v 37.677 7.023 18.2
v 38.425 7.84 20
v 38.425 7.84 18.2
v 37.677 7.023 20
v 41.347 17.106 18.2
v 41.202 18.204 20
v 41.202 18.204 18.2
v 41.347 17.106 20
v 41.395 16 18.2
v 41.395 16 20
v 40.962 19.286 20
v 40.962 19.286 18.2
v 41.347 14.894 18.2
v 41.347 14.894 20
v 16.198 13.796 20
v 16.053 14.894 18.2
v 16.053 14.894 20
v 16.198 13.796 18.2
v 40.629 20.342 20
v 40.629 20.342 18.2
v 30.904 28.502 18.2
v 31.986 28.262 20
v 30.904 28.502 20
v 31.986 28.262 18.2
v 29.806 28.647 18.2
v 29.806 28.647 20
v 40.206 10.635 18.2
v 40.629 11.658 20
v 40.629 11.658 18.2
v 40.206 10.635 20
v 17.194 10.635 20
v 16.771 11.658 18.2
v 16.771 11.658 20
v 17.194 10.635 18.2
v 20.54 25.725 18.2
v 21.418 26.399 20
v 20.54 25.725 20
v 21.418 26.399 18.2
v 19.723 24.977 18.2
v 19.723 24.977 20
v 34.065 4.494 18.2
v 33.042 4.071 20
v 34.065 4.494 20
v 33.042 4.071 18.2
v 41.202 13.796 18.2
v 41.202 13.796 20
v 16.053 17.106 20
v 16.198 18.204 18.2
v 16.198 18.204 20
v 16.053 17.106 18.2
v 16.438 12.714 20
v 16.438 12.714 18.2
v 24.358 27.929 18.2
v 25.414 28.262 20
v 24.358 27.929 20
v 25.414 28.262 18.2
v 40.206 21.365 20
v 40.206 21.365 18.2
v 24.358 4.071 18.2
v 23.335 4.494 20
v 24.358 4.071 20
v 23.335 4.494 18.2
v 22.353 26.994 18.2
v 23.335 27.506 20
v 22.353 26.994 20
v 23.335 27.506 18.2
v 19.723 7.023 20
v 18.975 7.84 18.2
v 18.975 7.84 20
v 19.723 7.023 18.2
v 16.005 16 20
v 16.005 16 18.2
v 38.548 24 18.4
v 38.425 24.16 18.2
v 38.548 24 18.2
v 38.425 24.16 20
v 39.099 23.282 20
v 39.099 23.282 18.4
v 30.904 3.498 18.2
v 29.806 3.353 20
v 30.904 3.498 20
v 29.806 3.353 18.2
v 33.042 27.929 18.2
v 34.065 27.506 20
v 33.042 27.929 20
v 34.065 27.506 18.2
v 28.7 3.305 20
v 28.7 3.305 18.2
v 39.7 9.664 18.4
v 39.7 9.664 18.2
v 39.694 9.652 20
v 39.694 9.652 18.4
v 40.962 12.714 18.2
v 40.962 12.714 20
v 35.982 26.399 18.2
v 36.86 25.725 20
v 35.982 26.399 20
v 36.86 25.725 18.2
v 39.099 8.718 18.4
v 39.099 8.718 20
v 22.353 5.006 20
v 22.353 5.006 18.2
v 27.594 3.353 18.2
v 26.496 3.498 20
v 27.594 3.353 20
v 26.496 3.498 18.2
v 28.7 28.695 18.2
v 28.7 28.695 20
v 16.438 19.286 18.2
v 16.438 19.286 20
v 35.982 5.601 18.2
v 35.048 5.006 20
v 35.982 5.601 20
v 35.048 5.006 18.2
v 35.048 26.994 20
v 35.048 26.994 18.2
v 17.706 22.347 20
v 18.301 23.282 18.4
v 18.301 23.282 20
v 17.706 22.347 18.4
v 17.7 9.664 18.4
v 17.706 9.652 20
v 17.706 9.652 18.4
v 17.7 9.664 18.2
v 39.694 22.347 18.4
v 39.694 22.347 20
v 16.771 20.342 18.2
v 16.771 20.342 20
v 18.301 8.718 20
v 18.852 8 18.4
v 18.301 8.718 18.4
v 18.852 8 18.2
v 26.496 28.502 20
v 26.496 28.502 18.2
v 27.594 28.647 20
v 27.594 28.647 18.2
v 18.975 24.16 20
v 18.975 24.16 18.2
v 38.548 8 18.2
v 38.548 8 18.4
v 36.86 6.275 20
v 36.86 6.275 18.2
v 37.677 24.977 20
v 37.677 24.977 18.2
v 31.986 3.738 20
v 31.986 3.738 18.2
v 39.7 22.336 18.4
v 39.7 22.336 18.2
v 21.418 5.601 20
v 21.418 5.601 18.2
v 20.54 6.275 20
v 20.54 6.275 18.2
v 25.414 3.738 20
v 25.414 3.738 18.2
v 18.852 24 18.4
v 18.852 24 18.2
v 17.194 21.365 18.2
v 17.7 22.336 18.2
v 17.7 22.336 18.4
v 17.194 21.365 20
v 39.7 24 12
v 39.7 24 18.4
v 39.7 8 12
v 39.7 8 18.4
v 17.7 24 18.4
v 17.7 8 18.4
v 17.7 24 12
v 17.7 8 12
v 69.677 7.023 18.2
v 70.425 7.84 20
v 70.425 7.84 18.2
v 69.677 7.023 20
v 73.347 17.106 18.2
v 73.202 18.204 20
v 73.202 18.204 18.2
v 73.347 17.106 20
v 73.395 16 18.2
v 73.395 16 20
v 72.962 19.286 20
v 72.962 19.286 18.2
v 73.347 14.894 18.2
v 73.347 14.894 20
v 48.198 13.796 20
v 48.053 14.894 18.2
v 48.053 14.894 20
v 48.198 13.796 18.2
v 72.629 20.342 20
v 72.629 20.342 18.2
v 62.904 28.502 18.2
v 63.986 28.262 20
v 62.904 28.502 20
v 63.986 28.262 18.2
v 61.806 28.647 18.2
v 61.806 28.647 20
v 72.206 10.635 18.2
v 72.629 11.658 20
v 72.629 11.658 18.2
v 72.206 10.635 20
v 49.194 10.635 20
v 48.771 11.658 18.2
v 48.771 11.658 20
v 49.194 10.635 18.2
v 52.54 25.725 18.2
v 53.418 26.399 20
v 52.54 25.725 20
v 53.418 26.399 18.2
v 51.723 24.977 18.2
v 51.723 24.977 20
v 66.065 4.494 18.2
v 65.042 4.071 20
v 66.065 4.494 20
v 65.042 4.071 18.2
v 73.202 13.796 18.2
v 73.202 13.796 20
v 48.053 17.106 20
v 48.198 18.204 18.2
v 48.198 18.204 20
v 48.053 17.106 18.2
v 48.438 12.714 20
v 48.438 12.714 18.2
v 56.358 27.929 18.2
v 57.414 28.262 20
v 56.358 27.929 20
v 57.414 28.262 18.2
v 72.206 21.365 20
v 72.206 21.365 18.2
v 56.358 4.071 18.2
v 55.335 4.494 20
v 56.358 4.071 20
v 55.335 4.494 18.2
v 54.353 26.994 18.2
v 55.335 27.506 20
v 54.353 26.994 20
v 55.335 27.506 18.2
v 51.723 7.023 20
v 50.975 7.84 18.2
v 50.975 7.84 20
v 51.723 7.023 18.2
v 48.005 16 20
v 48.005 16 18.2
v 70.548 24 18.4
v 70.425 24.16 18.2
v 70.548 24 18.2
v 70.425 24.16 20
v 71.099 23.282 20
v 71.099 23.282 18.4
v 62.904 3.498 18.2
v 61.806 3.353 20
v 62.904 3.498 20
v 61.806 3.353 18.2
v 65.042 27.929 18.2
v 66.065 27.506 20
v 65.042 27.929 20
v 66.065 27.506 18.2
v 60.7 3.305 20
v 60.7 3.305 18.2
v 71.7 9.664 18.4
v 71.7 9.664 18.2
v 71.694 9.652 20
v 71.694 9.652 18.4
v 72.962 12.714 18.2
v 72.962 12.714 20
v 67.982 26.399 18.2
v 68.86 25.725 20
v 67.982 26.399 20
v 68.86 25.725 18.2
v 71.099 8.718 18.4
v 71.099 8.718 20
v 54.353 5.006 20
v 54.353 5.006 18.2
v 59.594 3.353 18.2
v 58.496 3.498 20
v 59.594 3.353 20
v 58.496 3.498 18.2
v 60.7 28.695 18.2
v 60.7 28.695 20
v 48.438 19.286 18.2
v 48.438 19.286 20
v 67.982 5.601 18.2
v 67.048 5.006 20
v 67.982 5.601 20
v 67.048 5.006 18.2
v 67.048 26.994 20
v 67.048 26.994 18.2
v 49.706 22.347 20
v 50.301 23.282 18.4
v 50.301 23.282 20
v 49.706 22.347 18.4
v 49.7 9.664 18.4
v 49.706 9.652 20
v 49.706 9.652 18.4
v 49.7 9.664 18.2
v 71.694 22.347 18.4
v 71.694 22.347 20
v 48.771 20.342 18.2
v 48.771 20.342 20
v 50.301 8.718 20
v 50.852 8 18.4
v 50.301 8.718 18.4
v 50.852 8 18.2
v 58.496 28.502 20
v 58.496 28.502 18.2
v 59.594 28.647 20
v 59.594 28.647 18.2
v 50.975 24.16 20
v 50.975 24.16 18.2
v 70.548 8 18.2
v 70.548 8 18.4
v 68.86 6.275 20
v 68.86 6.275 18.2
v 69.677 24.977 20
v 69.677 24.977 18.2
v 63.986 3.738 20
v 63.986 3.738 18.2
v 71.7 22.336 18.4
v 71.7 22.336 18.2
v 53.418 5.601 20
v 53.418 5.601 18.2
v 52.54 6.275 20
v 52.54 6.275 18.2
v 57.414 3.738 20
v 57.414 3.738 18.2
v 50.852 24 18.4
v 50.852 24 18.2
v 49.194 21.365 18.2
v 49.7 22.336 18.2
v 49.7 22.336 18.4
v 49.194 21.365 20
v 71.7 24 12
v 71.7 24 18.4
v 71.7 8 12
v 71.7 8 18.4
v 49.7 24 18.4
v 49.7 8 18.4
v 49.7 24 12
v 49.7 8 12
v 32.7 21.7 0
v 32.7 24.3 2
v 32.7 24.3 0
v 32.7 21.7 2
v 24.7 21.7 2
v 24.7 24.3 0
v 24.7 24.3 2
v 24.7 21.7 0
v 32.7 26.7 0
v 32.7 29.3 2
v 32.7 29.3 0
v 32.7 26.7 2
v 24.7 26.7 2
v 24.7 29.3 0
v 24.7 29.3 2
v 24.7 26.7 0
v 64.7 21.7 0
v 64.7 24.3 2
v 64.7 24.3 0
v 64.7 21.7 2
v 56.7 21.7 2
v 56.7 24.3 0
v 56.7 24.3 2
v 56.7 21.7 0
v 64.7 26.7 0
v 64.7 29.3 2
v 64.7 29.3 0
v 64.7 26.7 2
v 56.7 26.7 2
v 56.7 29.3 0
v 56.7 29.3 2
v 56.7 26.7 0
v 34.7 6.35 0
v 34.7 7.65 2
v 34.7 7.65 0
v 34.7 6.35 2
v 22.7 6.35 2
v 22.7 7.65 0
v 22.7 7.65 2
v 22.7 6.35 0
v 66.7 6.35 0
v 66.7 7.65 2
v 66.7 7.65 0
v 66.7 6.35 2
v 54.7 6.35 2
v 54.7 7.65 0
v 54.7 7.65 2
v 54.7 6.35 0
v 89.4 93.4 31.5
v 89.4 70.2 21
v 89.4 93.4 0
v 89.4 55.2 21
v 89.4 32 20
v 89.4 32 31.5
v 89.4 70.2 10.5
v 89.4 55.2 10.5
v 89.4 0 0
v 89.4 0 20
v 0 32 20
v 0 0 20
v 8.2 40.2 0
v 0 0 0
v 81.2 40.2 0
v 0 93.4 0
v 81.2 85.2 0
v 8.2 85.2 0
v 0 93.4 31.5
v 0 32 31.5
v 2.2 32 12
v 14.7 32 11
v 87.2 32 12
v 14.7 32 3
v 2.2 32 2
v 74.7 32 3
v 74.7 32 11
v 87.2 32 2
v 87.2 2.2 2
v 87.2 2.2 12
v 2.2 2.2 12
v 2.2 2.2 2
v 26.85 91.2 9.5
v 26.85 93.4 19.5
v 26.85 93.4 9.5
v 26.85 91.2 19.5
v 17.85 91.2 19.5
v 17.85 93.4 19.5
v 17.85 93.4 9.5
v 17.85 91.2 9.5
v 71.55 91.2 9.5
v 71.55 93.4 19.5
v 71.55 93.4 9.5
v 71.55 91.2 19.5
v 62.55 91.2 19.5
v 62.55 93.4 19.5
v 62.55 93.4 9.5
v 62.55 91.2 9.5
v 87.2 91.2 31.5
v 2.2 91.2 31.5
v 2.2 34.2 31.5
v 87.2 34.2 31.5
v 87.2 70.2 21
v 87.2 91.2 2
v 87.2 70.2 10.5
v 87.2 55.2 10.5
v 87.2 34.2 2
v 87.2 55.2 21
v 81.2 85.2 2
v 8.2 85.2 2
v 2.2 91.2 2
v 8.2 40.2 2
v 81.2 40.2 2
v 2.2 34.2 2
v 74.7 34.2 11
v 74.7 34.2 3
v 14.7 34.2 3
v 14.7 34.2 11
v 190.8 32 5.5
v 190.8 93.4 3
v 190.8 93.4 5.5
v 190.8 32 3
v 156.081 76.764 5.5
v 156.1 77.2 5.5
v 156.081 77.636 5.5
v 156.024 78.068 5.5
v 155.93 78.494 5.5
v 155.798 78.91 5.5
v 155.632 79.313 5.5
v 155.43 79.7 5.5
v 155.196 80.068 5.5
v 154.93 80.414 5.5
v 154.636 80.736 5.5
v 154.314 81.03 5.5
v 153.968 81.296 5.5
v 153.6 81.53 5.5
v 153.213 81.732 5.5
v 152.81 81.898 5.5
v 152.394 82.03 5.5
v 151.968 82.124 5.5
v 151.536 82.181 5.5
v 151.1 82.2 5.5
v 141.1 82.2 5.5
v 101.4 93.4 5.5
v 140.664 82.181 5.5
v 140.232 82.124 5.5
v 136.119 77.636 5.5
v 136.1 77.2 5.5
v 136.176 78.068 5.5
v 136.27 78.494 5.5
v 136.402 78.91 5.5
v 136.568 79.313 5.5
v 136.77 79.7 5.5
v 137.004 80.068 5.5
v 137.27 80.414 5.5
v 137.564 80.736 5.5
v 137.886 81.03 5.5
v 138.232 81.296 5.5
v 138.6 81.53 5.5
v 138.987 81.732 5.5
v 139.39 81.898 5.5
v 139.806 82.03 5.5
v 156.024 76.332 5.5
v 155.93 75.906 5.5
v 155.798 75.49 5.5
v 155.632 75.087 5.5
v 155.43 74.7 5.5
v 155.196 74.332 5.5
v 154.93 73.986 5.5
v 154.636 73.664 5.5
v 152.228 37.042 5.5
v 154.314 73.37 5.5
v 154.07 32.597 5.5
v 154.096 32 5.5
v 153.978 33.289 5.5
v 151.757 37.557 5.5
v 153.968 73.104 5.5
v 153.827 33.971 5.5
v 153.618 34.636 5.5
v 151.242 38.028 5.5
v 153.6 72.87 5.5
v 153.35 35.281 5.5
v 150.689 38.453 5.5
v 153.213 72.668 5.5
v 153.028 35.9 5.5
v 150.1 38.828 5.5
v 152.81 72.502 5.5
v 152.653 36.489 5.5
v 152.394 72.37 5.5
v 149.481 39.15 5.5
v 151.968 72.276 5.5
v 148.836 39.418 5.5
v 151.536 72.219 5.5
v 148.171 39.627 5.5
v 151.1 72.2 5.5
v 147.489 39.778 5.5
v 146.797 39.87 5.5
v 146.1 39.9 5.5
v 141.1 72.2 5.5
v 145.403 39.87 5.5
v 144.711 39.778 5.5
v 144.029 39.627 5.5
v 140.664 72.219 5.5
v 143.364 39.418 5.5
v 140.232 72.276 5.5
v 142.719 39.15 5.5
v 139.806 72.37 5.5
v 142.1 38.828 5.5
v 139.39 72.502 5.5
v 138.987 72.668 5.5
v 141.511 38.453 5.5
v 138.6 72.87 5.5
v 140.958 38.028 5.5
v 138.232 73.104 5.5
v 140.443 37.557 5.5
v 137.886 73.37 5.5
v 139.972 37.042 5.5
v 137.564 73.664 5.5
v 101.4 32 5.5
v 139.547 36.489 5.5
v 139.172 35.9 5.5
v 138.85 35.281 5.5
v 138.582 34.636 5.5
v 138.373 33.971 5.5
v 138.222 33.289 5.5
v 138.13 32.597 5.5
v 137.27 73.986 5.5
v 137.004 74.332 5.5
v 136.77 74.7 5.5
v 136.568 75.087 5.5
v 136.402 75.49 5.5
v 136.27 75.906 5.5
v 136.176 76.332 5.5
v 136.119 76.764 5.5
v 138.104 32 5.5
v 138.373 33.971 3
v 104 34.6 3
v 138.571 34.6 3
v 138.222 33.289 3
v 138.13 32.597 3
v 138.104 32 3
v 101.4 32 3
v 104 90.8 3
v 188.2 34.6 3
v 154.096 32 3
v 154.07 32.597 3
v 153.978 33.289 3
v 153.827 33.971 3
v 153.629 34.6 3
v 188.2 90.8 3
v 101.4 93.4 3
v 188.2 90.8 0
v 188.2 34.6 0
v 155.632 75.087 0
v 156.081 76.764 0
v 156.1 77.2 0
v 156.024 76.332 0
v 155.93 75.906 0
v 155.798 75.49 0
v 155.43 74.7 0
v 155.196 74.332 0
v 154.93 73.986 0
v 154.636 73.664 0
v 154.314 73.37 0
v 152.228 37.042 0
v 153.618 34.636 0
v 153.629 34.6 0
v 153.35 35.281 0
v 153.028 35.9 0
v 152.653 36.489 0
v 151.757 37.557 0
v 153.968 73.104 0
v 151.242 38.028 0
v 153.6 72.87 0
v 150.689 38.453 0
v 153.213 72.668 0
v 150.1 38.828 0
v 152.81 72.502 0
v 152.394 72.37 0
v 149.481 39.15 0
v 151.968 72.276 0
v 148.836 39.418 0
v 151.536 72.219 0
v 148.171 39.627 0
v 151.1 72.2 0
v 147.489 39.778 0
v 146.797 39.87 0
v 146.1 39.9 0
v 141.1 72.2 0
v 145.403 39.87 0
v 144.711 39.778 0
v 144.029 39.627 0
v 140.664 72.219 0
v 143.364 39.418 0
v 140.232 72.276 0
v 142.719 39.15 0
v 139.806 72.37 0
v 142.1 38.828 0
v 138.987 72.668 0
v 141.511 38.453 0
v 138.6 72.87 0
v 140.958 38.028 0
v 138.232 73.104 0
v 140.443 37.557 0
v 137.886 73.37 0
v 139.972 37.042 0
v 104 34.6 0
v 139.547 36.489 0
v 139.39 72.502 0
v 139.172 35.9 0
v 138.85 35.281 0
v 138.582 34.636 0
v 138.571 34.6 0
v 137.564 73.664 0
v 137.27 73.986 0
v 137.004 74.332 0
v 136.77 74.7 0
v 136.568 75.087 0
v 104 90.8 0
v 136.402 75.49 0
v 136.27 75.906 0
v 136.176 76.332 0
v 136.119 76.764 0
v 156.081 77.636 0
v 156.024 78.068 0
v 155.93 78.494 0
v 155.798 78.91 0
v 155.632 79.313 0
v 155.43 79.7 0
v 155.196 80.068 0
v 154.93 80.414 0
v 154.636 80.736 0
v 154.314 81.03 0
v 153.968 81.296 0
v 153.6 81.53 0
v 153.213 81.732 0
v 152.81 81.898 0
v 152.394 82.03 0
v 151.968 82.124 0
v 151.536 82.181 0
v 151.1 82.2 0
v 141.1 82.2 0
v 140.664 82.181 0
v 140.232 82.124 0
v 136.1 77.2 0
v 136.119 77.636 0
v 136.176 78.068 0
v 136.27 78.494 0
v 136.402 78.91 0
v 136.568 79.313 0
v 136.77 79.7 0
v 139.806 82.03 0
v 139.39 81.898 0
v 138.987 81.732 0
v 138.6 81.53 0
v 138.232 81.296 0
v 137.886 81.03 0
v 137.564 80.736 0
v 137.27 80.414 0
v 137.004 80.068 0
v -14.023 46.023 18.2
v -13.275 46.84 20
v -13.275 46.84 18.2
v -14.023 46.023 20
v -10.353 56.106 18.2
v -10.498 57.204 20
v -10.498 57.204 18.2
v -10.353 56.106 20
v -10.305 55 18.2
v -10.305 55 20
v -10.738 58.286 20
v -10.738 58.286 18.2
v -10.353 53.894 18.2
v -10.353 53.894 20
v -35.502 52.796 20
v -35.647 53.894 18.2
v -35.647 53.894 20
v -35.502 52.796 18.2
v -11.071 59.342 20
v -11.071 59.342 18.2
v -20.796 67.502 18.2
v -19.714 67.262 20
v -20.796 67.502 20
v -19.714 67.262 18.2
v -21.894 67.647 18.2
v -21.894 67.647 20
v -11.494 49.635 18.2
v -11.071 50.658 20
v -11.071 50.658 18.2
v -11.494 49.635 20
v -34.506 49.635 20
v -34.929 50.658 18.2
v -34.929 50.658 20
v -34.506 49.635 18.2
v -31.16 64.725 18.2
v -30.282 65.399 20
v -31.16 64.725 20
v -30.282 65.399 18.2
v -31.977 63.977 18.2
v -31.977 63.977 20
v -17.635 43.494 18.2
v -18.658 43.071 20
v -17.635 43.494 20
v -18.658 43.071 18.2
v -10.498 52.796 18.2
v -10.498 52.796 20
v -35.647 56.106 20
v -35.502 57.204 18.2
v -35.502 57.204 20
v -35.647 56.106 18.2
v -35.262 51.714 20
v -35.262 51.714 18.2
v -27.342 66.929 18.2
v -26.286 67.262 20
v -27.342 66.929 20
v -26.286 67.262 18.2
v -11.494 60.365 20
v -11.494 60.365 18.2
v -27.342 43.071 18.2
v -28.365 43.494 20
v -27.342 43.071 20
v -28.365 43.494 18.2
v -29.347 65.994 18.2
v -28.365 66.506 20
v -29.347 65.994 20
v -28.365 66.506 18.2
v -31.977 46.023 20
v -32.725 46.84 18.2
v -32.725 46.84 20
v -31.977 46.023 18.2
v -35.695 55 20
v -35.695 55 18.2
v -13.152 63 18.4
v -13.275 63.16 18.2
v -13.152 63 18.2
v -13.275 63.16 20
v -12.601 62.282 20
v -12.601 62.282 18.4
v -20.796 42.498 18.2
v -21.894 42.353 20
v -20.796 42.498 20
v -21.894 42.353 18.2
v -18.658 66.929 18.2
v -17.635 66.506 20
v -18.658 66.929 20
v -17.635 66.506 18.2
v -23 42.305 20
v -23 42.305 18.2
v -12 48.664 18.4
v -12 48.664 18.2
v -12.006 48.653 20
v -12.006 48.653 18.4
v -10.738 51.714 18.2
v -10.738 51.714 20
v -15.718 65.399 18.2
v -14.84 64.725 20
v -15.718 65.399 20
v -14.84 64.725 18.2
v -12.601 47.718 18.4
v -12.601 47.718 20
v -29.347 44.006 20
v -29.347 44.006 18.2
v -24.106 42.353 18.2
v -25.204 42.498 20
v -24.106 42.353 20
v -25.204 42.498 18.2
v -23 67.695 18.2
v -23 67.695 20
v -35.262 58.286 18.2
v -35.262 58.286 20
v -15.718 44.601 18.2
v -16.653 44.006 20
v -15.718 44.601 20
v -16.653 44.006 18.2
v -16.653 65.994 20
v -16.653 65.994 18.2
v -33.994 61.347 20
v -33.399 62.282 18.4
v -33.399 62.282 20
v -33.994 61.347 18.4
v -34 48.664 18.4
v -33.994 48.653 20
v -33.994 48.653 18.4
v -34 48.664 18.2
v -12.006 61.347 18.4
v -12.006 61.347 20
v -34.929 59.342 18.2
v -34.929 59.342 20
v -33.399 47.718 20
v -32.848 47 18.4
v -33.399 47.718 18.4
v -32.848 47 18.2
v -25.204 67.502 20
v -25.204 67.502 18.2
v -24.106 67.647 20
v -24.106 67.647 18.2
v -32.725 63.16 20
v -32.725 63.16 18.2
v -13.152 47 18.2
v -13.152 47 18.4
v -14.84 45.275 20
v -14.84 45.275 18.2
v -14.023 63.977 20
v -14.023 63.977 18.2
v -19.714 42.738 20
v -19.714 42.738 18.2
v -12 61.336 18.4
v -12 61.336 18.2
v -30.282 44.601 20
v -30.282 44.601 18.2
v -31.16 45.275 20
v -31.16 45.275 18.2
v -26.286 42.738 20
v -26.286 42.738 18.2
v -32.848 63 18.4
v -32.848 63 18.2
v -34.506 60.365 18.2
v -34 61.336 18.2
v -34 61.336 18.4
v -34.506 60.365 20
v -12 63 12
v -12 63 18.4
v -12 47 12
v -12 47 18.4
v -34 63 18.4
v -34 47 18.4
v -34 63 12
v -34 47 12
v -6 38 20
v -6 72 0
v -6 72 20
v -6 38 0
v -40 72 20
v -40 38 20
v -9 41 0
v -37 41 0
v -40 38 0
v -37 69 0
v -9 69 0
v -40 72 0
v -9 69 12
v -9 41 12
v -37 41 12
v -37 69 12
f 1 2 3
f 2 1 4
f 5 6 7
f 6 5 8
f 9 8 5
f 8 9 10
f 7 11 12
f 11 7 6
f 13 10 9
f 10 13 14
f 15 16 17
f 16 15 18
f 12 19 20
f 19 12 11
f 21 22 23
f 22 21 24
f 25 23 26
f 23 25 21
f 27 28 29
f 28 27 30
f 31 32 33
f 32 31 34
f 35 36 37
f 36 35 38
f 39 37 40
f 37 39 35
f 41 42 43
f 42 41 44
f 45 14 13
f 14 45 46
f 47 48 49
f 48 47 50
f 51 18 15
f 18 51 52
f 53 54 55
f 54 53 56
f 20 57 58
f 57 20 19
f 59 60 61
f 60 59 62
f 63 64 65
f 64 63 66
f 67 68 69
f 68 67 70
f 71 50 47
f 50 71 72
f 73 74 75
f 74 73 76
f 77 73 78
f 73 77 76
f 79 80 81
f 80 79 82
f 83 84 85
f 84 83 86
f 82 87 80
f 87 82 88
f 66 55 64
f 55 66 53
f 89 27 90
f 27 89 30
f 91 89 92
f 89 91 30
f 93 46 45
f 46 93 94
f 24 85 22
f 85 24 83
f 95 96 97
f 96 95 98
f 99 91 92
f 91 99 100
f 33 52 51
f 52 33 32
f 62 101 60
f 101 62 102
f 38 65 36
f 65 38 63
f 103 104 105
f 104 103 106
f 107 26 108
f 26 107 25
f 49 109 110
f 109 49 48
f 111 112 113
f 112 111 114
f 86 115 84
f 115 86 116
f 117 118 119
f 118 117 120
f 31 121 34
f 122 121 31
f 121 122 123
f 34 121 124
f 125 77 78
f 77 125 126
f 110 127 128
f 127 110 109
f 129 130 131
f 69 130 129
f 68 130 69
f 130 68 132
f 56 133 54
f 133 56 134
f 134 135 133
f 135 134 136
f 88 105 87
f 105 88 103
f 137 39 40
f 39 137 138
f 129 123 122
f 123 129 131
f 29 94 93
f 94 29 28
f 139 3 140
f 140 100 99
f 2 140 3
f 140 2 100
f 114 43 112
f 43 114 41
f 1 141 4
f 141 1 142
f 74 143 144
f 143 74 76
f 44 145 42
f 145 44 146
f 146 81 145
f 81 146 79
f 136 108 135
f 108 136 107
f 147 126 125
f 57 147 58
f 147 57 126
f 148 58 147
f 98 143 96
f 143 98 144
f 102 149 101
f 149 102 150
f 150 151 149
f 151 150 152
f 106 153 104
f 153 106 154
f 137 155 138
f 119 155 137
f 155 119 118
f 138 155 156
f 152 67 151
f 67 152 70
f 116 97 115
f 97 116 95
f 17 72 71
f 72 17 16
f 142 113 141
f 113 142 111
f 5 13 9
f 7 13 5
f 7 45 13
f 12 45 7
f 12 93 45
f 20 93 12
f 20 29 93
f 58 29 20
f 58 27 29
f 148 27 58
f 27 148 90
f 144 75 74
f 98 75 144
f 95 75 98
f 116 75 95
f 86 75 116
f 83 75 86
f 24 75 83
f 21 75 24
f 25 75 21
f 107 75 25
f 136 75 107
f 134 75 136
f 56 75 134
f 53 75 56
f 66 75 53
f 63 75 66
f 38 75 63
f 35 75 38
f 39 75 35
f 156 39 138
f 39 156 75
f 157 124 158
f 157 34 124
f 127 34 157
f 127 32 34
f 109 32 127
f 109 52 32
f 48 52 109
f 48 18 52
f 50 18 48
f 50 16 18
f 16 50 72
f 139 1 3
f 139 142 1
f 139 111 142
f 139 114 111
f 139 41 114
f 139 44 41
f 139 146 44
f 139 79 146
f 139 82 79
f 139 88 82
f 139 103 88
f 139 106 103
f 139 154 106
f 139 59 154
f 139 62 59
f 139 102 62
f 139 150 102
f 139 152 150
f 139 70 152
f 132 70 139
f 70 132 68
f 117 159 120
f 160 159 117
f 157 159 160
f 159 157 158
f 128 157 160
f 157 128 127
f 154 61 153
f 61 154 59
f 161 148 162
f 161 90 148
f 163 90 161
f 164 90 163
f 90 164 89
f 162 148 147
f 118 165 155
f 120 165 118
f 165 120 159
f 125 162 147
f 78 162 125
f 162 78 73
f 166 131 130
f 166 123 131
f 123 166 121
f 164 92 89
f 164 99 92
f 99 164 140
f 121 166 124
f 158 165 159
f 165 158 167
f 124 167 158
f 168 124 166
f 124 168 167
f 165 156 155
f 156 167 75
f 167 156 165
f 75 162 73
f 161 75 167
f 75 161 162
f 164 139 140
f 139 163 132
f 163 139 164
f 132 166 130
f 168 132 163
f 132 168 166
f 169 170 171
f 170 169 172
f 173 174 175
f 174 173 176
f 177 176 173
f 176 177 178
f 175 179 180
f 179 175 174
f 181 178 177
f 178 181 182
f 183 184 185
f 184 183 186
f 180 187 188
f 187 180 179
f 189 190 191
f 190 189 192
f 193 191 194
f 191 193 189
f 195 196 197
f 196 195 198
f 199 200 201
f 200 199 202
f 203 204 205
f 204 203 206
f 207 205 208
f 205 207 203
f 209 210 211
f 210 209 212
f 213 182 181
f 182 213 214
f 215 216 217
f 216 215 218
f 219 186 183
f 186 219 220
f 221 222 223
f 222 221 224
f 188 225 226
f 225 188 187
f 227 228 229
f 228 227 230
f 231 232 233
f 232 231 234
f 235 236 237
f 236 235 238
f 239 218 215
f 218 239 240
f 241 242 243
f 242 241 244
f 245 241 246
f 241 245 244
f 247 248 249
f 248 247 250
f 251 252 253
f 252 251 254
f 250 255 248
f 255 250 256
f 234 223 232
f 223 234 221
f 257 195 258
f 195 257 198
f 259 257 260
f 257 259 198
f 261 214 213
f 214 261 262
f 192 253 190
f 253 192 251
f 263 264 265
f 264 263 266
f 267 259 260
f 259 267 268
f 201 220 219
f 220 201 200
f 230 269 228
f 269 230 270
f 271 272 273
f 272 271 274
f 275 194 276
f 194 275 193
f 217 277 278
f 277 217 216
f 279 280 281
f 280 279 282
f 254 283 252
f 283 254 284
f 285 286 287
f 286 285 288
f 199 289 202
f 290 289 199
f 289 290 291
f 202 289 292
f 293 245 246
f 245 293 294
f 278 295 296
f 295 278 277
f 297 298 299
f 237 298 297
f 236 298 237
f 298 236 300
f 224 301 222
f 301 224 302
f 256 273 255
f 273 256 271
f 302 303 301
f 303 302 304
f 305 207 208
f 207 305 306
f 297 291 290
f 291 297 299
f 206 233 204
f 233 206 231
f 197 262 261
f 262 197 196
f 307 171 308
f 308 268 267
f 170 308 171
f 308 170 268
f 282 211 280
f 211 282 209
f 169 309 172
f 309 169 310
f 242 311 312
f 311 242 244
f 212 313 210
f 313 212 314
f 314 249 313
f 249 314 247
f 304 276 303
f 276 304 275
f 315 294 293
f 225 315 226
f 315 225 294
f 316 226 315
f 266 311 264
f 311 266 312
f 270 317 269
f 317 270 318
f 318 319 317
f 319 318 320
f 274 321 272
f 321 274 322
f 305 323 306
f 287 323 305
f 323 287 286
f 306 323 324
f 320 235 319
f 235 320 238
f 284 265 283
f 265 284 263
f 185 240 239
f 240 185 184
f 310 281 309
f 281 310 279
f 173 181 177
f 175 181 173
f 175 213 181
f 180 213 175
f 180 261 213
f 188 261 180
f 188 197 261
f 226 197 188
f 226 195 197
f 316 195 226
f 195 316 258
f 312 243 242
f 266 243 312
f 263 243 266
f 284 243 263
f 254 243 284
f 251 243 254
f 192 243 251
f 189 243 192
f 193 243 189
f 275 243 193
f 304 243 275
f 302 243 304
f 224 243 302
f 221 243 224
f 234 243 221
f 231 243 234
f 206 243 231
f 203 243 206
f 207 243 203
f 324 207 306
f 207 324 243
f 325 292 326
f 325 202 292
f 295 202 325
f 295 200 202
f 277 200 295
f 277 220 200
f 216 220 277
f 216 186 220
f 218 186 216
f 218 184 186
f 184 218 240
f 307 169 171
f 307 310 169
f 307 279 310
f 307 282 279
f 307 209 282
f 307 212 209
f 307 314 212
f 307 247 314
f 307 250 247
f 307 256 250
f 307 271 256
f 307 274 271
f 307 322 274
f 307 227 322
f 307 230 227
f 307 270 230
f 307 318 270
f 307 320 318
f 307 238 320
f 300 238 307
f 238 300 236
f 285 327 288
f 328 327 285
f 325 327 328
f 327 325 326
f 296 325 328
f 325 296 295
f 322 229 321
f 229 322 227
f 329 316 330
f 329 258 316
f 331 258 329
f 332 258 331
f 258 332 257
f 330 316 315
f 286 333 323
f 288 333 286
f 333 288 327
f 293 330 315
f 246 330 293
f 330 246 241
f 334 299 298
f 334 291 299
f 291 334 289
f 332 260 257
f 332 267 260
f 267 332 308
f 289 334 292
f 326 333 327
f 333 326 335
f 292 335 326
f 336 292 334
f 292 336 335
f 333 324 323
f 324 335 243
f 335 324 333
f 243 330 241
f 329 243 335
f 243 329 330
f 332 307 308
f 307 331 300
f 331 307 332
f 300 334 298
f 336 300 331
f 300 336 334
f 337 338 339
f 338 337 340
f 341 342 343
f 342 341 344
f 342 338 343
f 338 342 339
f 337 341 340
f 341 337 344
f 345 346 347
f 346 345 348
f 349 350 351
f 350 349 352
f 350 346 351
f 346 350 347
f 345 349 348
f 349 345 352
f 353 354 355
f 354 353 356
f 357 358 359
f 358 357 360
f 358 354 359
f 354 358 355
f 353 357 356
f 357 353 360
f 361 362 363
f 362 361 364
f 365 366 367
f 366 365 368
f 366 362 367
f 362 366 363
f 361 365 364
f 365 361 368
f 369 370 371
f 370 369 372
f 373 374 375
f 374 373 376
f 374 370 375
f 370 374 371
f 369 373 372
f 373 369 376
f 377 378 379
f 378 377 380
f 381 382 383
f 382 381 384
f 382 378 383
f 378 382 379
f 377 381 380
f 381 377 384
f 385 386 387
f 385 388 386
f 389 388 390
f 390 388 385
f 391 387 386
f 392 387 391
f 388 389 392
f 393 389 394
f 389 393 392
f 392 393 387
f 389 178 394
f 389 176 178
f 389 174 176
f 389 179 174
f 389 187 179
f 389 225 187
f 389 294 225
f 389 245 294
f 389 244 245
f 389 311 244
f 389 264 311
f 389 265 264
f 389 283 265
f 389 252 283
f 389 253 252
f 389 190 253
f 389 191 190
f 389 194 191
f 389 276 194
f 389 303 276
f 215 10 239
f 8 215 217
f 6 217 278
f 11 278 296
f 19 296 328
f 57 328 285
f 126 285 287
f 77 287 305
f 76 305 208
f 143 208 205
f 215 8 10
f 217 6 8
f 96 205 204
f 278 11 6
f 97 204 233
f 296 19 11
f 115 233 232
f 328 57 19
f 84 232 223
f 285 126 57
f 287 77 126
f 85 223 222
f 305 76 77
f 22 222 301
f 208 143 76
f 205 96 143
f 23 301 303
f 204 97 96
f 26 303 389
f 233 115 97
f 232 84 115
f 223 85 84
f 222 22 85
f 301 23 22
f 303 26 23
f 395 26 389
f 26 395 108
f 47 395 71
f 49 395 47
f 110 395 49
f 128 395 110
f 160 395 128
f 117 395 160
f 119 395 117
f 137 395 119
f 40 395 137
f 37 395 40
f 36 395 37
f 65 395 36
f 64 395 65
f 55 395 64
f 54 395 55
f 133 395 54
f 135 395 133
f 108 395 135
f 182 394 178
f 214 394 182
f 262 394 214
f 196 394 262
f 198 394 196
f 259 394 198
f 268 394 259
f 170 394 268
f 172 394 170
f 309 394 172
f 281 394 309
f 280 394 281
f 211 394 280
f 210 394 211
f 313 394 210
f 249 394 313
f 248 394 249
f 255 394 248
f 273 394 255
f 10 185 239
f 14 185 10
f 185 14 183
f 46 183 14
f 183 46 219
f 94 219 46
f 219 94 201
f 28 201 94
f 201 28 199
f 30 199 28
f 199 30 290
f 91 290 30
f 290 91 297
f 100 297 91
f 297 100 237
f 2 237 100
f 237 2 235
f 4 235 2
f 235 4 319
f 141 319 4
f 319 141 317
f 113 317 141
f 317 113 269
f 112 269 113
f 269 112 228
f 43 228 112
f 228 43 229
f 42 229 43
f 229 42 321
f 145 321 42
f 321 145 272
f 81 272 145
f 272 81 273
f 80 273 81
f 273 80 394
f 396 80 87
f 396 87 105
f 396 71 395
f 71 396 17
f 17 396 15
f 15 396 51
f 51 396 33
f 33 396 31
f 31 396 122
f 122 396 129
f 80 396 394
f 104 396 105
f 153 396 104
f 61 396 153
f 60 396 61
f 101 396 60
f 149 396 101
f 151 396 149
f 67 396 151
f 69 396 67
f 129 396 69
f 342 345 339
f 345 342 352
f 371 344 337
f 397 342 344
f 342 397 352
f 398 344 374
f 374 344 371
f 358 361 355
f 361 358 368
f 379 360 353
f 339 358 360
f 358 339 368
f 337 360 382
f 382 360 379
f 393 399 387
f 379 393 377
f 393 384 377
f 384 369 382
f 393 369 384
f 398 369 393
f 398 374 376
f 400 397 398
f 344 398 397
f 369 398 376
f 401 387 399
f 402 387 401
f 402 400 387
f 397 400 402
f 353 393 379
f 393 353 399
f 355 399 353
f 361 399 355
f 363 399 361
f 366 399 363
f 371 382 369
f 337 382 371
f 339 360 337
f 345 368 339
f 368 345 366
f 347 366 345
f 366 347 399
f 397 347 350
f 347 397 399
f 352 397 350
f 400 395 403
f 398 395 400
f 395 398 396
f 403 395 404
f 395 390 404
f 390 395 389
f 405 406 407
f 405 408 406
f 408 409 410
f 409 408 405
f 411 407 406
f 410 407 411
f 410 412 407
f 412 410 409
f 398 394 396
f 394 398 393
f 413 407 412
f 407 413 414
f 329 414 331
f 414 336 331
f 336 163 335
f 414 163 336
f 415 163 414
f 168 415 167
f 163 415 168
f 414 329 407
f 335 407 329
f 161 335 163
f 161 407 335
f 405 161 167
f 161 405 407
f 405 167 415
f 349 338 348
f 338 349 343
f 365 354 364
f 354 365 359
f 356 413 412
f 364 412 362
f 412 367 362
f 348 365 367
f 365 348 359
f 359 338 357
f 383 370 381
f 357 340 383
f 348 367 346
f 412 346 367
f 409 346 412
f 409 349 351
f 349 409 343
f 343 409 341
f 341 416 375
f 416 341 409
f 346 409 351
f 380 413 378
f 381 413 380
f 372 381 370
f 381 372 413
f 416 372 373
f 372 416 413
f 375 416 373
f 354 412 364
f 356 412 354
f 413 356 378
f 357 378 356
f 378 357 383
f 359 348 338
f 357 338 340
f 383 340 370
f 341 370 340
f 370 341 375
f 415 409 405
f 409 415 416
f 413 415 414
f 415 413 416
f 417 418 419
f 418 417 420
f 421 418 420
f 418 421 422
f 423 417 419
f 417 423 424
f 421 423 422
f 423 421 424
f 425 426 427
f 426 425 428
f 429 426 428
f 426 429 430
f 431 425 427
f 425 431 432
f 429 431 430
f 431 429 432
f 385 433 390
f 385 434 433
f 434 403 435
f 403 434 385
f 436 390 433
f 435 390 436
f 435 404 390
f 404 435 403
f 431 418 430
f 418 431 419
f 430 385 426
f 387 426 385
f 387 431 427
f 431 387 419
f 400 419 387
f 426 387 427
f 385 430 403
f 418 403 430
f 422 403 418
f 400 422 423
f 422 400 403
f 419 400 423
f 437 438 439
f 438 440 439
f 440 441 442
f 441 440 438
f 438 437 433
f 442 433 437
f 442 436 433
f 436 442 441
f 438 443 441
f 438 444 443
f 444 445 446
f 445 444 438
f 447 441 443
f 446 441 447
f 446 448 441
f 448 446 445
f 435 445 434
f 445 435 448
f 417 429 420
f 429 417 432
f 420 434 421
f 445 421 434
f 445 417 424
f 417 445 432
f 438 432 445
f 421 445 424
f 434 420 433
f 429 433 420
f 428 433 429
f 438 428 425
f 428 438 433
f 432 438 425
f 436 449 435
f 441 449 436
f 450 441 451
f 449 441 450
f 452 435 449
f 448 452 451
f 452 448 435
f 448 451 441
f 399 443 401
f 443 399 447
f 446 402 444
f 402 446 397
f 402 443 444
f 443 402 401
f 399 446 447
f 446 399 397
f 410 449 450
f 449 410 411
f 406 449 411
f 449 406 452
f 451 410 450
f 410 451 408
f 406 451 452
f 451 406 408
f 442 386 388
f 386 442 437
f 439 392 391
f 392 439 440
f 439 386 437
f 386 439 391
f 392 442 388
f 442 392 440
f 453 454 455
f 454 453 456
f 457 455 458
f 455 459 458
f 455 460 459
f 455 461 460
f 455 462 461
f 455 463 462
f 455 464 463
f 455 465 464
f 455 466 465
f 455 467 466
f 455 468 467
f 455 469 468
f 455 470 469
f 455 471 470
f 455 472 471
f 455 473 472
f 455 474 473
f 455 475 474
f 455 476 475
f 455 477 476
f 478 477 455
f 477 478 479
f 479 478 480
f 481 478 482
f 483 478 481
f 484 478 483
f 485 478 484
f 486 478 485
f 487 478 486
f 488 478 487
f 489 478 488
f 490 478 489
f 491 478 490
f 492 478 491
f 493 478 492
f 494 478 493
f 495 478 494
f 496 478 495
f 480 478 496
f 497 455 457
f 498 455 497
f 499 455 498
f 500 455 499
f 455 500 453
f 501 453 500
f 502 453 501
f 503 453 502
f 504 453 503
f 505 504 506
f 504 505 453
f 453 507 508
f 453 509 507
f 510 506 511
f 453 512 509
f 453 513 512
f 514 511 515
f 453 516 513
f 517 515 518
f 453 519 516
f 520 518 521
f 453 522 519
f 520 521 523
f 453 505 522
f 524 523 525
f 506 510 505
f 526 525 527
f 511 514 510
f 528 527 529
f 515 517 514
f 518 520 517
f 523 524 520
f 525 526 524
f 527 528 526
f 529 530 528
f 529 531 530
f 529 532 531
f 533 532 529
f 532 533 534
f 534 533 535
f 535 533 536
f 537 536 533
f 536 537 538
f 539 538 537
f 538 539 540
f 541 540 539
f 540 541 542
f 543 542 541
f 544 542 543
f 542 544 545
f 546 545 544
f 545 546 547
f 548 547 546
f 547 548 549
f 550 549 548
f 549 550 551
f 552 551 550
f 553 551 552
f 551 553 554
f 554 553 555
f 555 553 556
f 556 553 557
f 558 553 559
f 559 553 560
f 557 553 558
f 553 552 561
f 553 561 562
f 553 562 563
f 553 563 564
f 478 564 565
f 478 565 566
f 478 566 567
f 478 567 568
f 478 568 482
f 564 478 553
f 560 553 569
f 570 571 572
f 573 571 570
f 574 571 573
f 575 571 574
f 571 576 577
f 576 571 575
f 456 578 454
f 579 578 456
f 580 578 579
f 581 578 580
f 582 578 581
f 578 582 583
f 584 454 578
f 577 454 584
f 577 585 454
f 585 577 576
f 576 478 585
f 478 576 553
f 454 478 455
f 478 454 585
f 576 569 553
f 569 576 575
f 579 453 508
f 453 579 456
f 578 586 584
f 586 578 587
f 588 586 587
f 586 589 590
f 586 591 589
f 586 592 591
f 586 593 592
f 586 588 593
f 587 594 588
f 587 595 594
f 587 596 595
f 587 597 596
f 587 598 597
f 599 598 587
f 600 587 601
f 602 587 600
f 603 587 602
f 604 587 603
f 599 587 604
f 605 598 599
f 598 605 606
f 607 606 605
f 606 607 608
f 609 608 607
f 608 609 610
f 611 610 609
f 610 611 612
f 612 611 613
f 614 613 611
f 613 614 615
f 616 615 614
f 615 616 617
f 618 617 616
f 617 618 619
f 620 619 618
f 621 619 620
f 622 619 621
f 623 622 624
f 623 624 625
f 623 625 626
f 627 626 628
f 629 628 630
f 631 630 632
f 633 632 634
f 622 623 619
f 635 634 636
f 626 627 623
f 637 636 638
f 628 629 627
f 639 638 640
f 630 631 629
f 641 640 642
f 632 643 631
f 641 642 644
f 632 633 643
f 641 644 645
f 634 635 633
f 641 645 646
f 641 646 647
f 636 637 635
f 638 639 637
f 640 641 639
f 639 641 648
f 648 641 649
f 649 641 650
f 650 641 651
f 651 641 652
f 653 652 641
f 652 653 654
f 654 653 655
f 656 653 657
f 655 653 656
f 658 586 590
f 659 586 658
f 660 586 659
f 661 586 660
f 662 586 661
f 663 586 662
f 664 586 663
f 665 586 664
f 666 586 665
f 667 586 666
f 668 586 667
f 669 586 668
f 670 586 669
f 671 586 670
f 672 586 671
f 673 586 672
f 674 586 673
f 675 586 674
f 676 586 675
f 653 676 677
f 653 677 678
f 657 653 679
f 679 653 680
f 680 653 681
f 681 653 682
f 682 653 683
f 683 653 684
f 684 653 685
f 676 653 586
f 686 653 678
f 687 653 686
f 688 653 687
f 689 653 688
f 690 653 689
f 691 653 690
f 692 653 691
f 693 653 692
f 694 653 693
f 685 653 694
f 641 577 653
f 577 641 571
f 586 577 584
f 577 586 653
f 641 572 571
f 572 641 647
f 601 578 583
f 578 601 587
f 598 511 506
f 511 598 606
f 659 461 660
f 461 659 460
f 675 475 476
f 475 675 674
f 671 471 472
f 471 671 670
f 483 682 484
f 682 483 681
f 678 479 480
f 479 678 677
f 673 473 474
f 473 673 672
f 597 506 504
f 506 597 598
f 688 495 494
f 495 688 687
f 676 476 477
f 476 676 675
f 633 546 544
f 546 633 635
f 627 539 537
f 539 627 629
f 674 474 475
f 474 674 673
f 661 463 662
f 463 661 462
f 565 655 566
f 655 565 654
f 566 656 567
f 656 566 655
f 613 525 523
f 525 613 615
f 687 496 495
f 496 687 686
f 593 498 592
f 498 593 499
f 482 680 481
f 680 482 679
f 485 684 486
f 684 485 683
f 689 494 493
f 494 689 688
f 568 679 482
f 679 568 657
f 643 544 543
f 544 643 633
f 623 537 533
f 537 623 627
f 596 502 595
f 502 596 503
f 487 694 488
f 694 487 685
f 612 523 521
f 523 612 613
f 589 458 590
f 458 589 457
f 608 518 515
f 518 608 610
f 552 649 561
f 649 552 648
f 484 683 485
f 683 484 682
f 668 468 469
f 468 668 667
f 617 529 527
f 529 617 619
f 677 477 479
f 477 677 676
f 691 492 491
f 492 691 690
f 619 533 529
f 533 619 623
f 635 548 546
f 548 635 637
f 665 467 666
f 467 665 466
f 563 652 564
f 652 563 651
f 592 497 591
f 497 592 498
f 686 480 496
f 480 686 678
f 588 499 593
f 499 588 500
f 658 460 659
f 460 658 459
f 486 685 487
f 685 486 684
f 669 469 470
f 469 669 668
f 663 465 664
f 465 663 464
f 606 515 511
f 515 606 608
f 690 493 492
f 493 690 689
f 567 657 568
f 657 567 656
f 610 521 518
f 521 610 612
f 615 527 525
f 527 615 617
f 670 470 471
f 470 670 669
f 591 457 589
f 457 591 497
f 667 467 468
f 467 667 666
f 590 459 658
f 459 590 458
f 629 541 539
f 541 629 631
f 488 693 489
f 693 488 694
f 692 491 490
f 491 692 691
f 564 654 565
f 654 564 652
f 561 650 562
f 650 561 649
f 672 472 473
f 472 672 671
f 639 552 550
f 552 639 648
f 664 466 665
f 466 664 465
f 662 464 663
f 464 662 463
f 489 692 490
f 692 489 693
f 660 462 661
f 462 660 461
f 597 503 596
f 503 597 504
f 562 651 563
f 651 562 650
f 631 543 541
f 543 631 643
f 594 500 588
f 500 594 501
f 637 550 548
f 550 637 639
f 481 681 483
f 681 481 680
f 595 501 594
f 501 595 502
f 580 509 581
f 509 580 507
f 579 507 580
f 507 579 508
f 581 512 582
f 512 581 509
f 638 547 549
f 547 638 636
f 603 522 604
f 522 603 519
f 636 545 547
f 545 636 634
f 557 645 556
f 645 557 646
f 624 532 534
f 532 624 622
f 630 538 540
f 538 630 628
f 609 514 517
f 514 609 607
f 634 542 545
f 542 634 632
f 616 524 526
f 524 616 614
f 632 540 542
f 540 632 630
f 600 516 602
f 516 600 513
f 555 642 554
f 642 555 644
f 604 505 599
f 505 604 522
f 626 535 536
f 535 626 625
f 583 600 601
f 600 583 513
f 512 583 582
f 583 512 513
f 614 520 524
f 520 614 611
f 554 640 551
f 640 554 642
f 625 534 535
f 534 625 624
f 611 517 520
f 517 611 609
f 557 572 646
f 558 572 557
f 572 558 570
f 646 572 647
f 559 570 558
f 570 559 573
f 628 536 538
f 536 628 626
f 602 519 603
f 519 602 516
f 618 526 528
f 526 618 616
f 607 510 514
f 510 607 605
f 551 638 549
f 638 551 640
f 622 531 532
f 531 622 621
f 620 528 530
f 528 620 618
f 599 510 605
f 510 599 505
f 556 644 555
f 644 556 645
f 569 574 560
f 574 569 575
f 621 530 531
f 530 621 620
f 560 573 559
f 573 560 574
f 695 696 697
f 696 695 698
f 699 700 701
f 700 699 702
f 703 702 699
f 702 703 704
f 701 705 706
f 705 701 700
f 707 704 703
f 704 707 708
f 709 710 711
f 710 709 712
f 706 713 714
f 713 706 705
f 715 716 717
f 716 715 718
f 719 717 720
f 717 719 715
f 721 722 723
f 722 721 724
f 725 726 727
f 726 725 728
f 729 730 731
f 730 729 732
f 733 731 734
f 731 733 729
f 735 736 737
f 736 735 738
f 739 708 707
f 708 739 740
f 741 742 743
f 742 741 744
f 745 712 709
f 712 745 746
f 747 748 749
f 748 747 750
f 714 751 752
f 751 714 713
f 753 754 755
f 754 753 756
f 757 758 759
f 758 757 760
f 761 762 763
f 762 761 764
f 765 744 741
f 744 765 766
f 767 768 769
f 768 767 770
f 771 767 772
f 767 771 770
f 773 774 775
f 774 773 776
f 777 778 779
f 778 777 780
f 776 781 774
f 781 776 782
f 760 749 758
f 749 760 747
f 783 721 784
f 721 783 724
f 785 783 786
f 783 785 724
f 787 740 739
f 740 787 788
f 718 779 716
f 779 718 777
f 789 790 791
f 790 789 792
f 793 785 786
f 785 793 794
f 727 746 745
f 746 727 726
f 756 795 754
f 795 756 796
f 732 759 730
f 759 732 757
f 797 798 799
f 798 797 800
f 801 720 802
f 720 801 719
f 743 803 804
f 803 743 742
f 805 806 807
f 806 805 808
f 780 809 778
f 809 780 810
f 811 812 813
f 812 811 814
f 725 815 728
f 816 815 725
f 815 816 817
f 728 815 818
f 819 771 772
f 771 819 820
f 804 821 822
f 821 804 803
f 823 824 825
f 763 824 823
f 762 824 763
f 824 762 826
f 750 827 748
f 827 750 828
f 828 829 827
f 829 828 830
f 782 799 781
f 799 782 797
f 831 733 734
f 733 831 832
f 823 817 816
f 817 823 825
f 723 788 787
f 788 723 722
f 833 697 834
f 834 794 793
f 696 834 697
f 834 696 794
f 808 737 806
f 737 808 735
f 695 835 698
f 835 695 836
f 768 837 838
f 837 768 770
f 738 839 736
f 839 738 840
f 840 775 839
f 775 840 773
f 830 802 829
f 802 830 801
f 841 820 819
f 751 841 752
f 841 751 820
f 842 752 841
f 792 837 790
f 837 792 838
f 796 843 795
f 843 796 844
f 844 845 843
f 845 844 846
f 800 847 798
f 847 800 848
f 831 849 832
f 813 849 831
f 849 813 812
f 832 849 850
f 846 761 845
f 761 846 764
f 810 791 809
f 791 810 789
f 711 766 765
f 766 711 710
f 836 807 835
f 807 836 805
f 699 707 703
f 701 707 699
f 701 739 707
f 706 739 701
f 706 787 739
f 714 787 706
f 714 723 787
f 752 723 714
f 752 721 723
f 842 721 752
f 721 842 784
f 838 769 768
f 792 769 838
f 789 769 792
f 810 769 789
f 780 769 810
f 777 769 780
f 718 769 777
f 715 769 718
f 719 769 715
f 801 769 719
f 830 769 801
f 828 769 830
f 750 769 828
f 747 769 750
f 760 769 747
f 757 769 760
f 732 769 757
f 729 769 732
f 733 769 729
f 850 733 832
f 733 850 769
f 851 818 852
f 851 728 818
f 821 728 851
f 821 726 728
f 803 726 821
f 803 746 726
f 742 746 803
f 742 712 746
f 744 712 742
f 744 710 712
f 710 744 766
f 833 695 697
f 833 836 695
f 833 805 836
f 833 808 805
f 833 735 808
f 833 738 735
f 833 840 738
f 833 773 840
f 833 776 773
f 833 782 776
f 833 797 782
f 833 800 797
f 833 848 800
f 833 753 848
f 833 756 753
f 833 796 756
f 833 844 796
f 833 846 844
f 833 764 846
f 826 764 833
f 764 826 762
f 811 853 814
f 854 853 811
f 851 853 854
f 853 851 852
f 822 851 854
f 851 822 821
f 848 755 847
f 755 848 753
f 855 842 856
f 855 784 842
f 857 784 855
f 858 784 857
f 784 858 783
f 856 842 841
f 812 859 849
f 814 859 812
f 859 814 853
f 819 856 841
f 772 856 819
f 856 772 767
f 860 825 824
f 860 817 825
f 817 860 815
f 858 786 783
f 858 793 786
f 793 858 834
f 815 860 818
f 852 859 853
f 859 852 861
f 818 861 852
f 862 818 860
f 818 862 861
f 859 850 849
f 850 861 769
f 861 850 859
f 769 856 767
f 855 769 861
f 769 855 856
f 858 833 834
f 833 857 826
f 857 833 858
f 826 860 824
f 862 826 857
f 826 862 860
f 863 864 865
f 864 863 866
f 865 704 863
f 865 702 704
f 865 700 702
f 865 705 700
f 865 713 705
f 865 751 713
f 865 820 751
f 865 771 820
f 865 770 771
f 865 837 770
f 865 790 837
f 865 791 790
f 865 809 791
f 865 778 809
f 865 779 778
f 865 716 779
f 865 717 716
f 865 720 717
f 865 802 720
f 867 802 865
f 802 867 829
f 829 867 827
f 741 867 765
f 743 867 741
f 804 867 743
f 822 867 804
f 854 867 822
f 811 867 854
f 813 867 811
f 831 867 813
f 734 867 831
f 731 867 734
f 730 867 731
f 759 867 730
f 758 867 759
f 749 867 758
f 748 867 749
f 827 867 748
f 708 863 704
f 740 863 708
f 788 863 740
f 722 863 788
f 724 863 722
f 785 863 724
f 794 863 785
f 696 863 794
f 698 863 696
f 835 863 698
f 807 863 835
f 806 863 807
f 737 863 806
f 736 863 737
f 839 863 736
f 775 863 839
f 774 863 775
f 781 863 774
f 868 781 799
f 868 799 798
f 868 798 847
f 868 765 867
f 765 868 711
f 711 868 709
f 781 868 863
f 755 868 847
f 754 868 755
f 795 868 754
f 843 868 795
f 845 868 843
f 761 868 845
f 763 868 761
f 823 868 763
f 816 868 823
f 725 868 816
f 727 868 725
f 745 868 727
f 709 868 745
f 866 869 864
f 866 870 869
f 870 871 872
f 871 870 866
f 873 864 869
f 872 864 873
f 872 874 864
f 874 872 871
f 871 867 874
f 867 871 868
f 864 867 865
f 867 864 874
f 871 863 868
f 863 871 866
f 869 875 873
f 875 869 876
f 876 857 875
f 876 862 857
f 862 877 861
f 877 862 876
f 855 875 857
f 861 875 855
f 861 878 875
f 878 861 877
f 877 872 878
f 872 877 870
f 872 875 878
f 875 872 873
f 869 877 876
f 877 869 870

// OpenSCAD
/* =====================================================================
   DESK HELPER — v6
   Closed box + lid. Screen mounts on top, separately.
   ---------------------------------------------------------------------
   WHAT CHANGED FROM v5
     - screen holder removed entirely; you build that on top of the lid
     - box walls raised so the lid clears the Pico and the jumper wires
     - removable lid with a locating lip
     - cable pass-through in the lid for the screen wires
     - USB cutout added — needed now that the walls are taller than
       the Pico's socket

   STILL BUILT AROUND YOUR STLs
     Button: cap / stem / guide / mount. The 24.89 mm mount disc drops
     into a counterbore in the front shelf and finishes flush. Cap ends
     up 9.4 mm above the shelf.

   HOLDING THE WIRES ON, WITHOUT SOLDER OR HOT GLUE
     Under each button the shelf floor has three slots. The single
     narrow one is a friction clamp: push the jumper wire into it and
     it grips by itself. The pair behind take a zip tie if you have
     one. Either way the wire is anchored ~10 mm downstream of the
     connector, so tugging the cable never levers the connector off
     the switch leg. That is what actually keeps it attached.

     Do NOT superglue near the switch. It wicks along stranded wire
     and into seams, and the stem has to slide freely just above.

   >>> CHECK usb_side BEFORE PRINTING <<<
   Look down at the tray with the buttons nearest you. If the Pico's
   USB socket points right, leave usb_side = 1. If left, set it to -1.
   ===================================================================== */

part = "all";     // "coupon" | "lid" | "tray" | "spacer" | "all"

/* ---------- FROM YOUR BUTTON STLs — already measured ---------------- */
mount_d    = 24.89;  // diameter of the mount disc
mount_t    = 1.80;   // thickness of the disc
mount_boss = [22.0, 16.0]; // slot below the disc. Yours arrive with
                           //   the tactile switch already fitted, and the
                           //   Dupont connectors on the legs splay out
                           //   wider than the switch body itself. This
                           //   cavity is fully hidden under the shelf, so
                           //   it costs nothing to leave it generous.

/* ---------- BREADBOARD ---------------------------------------------- */
bb_len     = 83.0;
bb_wid     = 55.0;
bb_h       = 9.5;    // INCLUDING adhesive backing

/* ---------- HEIGHT --------------------------------------------------- */
headroom   = 20.0;   // clear space above the breadboard surface.
                     //   A male Dupont housing stands ~11 mm proud and
                     //   the wire bends over above that. Lower this to
                     //   16 for a squatter box if your wiring is flat.

/* ---------- USB ------------------------------------------------------ */
usb_side   = 1;      // 1 = right wall, -1 = left wall
usb_w      = 15.0;   // opening width
usb_z0     = 10.5;   // bottom of the opening, above the floor
usb_z1     = 21.0;   // top. The socket itself only reaches ~17.4,
                     //   but a micro-USB plug's moulding is taller than
                     //   the socket, so the opening has to clear that
                     //   rather than just the connector.

/* ---------- LID ------------------------------------------------------ */
lid_t      = 2.5;
lid_lip    = 3.0;    // depth of the locating lip
lid_clr    = 0.4;    // clearance so it lifts off easily
cable_w    = 20.0;   // pass-through for the screen wires
cable_d    = 10.0;
cable_back = 14.0;   // its centre, measured in from the back wall

/* ---------- SPACER COLLAR -------------------------------------------- */
spacer_h   = 15.0;   // how much height it adds. 10-20 all work.
ledge_t    = 2.0;    // ledge the lid's lip lands on
sp_lipw    = 2.0;    // wall of the locating lip underneath

/* ---------- BUZZER --------------------------------------------------- */
buz_bay    = false;  // true = adds an open bay at the back,
                     //   which makes the box 28 mm deeper
buz_w      = 24.0;   // CONFIRM WITH CALIPERS
buz_d      = 20.0;
buz_wall   = 1.6;
buz_lip    = 6.0;
buz_clr    = 0.8;

/* ---------- FITS ----------------------------------------------------- */
mount_clr  = 0.5;    // clearance on the mount disc; it should drop in
fit        = 1.0;    // clearance per side around the breadboard.
                     //   Nominal half-size boards are 83 x 55 but they
                     //   vary, and moulding flash adds a little. At 1.0
                     //   the pocket is 85 x 57, which swallows anything
                     //   in that class. The adhesive backing stops it
                     //   sliding, so a loose pocket costs you nothing.
wall       = 2.2;
floor_t    = 2.0;

/* ---------- BUTTON SHELF --------------------------------------------- */
btn_count  = 2;
btn_gap    = 32.0;   // centre to centre; must exceed mount_d
tie_slot   = [8.0, 2.6];   // zip-tie slots for wire strain relief
tie_dy     = [7, 12];      // their offsets behind the button centre
pinch_slot = [12.0, 1.3];  // friction slot — press a jumper wire into
                           //   this and it grips on its own, no tie and
                           //   no glue needed. 1.3 suits ~1.6 mm jumper
                           //   wire; widen to 1.5 if it will not go in.
pinch_dy   = -9;           // in front of the button centre
shelf_d    = 32.0;
shelf_top  = 20.0;
shelf_t    = 8.0;
$fn        = 72;

/* ---------- DERIVED --------------------------------------------------- */
mount_bore  = mount_d + mount_clr;
shelf_bot   = shelf_top - shelf_t;

pocket_l    = bb_len + 2*fit;
pocket_w    = bb_wid + 2*fit;

Z           = floor_t + bb_h + headroom;   // top of the box walls

y_front     = shelf_d;                     // box starts here
y_pocket    = y_front + wall;
y_backwall  = y_pocket + pocket_w;
y_boxback   = y_backwall + wall;
box_d       = y_boxback - y_front;

X = pocket_l + 2*wall;

bay_w       = buz_d + buz_clr + 2*buz_wall;   // module turned 90 deg
bay_d       = buz_w + buz_clr + 2*buz_wall;
Y = buz_bay ? y_boxback + bay_d : y_boxback;

btn_x = [ for (i = [0:btn_count-1])
          X/2 + (i - (btn_count-1)/2) * btn_gap ];

assert(btn_gap > mount_d + 3, "Caps will collide — raise btn_gap.");
assert(shelf_d > mount_d + 5, "Shelf too shallow for the caps.");
assert(shelf_t > mount_t + 2, "Shelf too thin for the counterbore.");
assert(usb_z1 < Z, "USB opening is taller than the wall.");
assert(cable_back > cable_d/2 + 2, "Cable slot runs into the back wall.");

echo(str("Footprint:    ", X, " x ", Y, " mm"));
echo(str("Board pocket: ", pocket_l, " x ", pocket_w,
         " mm (board assumed ", bb_len, " x ", bb_wid, ")"));
echo(str("Box walls:    ", Z, " mm; with lid ", Z + lid_t, " mm"));
echo(str("Caps reach:   ", shelf_top + 9.4, " mm"));
echo(str("Headroom above breadboard: ", headroom, " mm"));
echo(str("With spacer: ", Z + spacer_h + lid_t, " mm total, ",
         headroom + spacer_h, " mm of wire room"));
echo(str("USB opening on the ", usb_side > 0 ? "RIGHT" : "LEFT", " wall"));

/* ===================================================================== */

// Counterbore for the mount disc, plus a slot for everything below it.
module mount_recess(x, y) {
    translate([x, y, shelf_top - mount_t])
        cylinder(h = mount_t + 0.2, d = mount_bore);
    translate([x - mount_boss[0]/2, y - mount_boss[1]/2, shelf_bot - 1])
        cube([mount_boss[0], mount_boss[1], shelf_t - mount_t + 1.2]);
}

module button_shelf() {
    difference() {
        cube([X, shelf_d, shelf_top]);
        // hollow underneath, open at the back into the box
        translate([wall, wall, floor_t])
            cube([X - 2*wall, shelf_d - wall + 0.1, shelf_bot - floor_t]);
        for (x = btn_x) mount_recess(x, shelf_d/2);
        // strain relief: thread a zip tie down one slot and up the other
        // to clamp each button's wires against the shelf floor
        for (x = btn_x) {
            for (dy = tie_dy)
                translate([x - tie_slot[0]/2,
                           shelf_d/2 + dy - tie_slot[1]/2, -1])
                    cube([tie_slot[0], tie_slot[1], floor_t + 2]);
            // friction slot: push the wire in, it holds itself
            translate([x - pinch_slot[0]/2,
                       shelf_d/2 + pinch_dy - pinch_slot[1]/2, -1])
                cube([pinch_slot[0], pinch_slot[1], floor_t + 2]);
        }
    }
}

module box() {
    difference() {
        translate([0, y_front, 0]) cube([X, box_d, Z]);
        // breadboard pocket, open all the way to the top
        translate([wall, y_pocket, floor_t])
            cube([pocket_l, pocket_w, Z]);
        // floor window, saves material
        translate([wall + 6, y_pocket + 6, -1])
            cube([pocket_l - 12, pocket_w - 12, floor_t + 2]);
        // wire window through the front wall, into the shelf cavity
        translate([X/2 - 30, y_front - 0.5, floor_t + 1])
            cube([60, wall + 1, shelf_bot - floor_t - 2]);
        // USB opening
        translate([usb_side > 0 ? X - wall - 0.5 : -0.5,
                   y_pocket + pocket_w/2 - usb_w/2, usb_z0])
            cube([wall + 1, usb_w, usb_z1 - usb_z0]);
        // cable notches in the back wall, for the buzzer lead
        for (x = [X/4, 3*X/4])
            translate([x - 4.5, y_backwall - 0.5, floor_t + bb_h - 2])
                cube([9, wall + 1, 10]);
    }
}

// Open bay behind the box. Module lies flat, sound facing up.
module buzzer_bay() {
    difference() {
        translate([wall, y_boxback, 0]) cube([bay_w, bay_d, buz_lip]);
        translate([wall + buz_wall, y_boxback + buz_wall, floor_t])
            cube([buz_d + buz_clr, buz_w + buz_clr, buz_lip]);
        // notch for the JST lead, facing the box
        translate([wall + bay_w/2 - 4, y_boxback - 0.5, floor_t + 1])
            cube([8, buz_wall + 1, buz_lip]);
    }
}

module tray() {
    union() {
        button_shelf();
        box();
        if (buz_bay) buzzer_bay();
    }
}

/* ---- LID -------------------------------------------------------------
   Prints flat, lip upwards, no supports. Sits on the box walls and
   locates on the lip. Lift it off by the cable slot.
   --------------------------------------------------------------------- */
module lid() {
    cy = y_backwall - cable_back;      // centre of the cable slot
    difference() {
        union() {
            translate([0, y_front, 0]) cube([X, box_d, lid_t]);
            // locating lip, drops into the breadboard opening
            translate([wall + lid_clr, y_pocket + lid_clr, -lid_lip])
                cube([pocket_l - 2*lid_clr, pocket_w - 2*lid_clr, lid_lip]);
        }
        // cable pass-through, rounded ends
        hull() for (s = [-1, 1])
            translate([X/2 + s*(cable_w - cable_d)/2, cy, -lid_lip - 1])
                cylinder(h = lid_t + lid_lip + 2, d = cable_d);
        // finger notch at the front edge, to lift it off
        translate([X/2, y_front - 0.1, -lid_lip - 1])
            cylinder(h = lid_t + lid_lip + 2, d = 16);
    }
}

/* ---- SPACER COLLAR ---------------------------------------------------
   Goes between the tray and the lid to make room for the wiring.
   Its lip drops into the box the same way the lid's did, and its own
   opening then accepts the lid's lip — so the existing lid still
   locates properly and nothing else needs reprinting.
   Print it lip-down, as oriented. No supports.
   --------------------------------------------------------------------- */
module spacer() {
    pl2 = pocket_l - 2*lid_clr;
    pw2 = pocket_w - 2*lid_clr;
    difference() {
        union() {
            translate([0, y_front, 0]) cube([X, box_d, spacer_h]);
            // locating lip, drops into the box opening
            translate([wall + lid_clr, y_pocket + lid_clr, -lid_lip])
                cube([pl2, pw2, lid_lip]);
        }
        // socket above the ledge, takes the lid's lip
        translate([wall, y_pocket, ledge_t])
            cube([pocket_l, pocket_w, spacer_h]);
        // wire opening straight through
        translate([wall + lid_clr + sp_lipw,
                   y_pocket + lid_clr + sp_lipw, -lid_lip - 1])
            cube([pl2 - 2*sp_lipw, pw2 - 2*sp_lipw,
                  spacer_h + lid_lip + 2]);
    }
}

// One mount station. Print this to check the disc drops in flush.
module coupon() {
    difference() {
        translate([X/2 - 17, shelf_d/2 - 17, 0]) cube([34, 34, shelf_top]);
        mount_recess(X/2, shelf_d/2);
        translate([X/2 - 14, shelf_d/2 - 14, -1])
            cube([28, 28, shelf_bot + 1]);
    }
}

/* ---- OUTPUT ---------------------------------------------------------- */
if (part == "tray")   tray();
if (part == "lid")    translate([0, -y_front, lid_lip]) lid();
if (part == "coupon") coupon();
if (part == "spacer") translate([0, -y_front, lid_lip]) spacer();
if (part == "all") {
    tray();
    translate([X + 12, 0, lid_lip]) lid();
    translate([-X/2 + 17 - 40, shelf_d/2 - 17 + 40, 0]) coupon();
}
